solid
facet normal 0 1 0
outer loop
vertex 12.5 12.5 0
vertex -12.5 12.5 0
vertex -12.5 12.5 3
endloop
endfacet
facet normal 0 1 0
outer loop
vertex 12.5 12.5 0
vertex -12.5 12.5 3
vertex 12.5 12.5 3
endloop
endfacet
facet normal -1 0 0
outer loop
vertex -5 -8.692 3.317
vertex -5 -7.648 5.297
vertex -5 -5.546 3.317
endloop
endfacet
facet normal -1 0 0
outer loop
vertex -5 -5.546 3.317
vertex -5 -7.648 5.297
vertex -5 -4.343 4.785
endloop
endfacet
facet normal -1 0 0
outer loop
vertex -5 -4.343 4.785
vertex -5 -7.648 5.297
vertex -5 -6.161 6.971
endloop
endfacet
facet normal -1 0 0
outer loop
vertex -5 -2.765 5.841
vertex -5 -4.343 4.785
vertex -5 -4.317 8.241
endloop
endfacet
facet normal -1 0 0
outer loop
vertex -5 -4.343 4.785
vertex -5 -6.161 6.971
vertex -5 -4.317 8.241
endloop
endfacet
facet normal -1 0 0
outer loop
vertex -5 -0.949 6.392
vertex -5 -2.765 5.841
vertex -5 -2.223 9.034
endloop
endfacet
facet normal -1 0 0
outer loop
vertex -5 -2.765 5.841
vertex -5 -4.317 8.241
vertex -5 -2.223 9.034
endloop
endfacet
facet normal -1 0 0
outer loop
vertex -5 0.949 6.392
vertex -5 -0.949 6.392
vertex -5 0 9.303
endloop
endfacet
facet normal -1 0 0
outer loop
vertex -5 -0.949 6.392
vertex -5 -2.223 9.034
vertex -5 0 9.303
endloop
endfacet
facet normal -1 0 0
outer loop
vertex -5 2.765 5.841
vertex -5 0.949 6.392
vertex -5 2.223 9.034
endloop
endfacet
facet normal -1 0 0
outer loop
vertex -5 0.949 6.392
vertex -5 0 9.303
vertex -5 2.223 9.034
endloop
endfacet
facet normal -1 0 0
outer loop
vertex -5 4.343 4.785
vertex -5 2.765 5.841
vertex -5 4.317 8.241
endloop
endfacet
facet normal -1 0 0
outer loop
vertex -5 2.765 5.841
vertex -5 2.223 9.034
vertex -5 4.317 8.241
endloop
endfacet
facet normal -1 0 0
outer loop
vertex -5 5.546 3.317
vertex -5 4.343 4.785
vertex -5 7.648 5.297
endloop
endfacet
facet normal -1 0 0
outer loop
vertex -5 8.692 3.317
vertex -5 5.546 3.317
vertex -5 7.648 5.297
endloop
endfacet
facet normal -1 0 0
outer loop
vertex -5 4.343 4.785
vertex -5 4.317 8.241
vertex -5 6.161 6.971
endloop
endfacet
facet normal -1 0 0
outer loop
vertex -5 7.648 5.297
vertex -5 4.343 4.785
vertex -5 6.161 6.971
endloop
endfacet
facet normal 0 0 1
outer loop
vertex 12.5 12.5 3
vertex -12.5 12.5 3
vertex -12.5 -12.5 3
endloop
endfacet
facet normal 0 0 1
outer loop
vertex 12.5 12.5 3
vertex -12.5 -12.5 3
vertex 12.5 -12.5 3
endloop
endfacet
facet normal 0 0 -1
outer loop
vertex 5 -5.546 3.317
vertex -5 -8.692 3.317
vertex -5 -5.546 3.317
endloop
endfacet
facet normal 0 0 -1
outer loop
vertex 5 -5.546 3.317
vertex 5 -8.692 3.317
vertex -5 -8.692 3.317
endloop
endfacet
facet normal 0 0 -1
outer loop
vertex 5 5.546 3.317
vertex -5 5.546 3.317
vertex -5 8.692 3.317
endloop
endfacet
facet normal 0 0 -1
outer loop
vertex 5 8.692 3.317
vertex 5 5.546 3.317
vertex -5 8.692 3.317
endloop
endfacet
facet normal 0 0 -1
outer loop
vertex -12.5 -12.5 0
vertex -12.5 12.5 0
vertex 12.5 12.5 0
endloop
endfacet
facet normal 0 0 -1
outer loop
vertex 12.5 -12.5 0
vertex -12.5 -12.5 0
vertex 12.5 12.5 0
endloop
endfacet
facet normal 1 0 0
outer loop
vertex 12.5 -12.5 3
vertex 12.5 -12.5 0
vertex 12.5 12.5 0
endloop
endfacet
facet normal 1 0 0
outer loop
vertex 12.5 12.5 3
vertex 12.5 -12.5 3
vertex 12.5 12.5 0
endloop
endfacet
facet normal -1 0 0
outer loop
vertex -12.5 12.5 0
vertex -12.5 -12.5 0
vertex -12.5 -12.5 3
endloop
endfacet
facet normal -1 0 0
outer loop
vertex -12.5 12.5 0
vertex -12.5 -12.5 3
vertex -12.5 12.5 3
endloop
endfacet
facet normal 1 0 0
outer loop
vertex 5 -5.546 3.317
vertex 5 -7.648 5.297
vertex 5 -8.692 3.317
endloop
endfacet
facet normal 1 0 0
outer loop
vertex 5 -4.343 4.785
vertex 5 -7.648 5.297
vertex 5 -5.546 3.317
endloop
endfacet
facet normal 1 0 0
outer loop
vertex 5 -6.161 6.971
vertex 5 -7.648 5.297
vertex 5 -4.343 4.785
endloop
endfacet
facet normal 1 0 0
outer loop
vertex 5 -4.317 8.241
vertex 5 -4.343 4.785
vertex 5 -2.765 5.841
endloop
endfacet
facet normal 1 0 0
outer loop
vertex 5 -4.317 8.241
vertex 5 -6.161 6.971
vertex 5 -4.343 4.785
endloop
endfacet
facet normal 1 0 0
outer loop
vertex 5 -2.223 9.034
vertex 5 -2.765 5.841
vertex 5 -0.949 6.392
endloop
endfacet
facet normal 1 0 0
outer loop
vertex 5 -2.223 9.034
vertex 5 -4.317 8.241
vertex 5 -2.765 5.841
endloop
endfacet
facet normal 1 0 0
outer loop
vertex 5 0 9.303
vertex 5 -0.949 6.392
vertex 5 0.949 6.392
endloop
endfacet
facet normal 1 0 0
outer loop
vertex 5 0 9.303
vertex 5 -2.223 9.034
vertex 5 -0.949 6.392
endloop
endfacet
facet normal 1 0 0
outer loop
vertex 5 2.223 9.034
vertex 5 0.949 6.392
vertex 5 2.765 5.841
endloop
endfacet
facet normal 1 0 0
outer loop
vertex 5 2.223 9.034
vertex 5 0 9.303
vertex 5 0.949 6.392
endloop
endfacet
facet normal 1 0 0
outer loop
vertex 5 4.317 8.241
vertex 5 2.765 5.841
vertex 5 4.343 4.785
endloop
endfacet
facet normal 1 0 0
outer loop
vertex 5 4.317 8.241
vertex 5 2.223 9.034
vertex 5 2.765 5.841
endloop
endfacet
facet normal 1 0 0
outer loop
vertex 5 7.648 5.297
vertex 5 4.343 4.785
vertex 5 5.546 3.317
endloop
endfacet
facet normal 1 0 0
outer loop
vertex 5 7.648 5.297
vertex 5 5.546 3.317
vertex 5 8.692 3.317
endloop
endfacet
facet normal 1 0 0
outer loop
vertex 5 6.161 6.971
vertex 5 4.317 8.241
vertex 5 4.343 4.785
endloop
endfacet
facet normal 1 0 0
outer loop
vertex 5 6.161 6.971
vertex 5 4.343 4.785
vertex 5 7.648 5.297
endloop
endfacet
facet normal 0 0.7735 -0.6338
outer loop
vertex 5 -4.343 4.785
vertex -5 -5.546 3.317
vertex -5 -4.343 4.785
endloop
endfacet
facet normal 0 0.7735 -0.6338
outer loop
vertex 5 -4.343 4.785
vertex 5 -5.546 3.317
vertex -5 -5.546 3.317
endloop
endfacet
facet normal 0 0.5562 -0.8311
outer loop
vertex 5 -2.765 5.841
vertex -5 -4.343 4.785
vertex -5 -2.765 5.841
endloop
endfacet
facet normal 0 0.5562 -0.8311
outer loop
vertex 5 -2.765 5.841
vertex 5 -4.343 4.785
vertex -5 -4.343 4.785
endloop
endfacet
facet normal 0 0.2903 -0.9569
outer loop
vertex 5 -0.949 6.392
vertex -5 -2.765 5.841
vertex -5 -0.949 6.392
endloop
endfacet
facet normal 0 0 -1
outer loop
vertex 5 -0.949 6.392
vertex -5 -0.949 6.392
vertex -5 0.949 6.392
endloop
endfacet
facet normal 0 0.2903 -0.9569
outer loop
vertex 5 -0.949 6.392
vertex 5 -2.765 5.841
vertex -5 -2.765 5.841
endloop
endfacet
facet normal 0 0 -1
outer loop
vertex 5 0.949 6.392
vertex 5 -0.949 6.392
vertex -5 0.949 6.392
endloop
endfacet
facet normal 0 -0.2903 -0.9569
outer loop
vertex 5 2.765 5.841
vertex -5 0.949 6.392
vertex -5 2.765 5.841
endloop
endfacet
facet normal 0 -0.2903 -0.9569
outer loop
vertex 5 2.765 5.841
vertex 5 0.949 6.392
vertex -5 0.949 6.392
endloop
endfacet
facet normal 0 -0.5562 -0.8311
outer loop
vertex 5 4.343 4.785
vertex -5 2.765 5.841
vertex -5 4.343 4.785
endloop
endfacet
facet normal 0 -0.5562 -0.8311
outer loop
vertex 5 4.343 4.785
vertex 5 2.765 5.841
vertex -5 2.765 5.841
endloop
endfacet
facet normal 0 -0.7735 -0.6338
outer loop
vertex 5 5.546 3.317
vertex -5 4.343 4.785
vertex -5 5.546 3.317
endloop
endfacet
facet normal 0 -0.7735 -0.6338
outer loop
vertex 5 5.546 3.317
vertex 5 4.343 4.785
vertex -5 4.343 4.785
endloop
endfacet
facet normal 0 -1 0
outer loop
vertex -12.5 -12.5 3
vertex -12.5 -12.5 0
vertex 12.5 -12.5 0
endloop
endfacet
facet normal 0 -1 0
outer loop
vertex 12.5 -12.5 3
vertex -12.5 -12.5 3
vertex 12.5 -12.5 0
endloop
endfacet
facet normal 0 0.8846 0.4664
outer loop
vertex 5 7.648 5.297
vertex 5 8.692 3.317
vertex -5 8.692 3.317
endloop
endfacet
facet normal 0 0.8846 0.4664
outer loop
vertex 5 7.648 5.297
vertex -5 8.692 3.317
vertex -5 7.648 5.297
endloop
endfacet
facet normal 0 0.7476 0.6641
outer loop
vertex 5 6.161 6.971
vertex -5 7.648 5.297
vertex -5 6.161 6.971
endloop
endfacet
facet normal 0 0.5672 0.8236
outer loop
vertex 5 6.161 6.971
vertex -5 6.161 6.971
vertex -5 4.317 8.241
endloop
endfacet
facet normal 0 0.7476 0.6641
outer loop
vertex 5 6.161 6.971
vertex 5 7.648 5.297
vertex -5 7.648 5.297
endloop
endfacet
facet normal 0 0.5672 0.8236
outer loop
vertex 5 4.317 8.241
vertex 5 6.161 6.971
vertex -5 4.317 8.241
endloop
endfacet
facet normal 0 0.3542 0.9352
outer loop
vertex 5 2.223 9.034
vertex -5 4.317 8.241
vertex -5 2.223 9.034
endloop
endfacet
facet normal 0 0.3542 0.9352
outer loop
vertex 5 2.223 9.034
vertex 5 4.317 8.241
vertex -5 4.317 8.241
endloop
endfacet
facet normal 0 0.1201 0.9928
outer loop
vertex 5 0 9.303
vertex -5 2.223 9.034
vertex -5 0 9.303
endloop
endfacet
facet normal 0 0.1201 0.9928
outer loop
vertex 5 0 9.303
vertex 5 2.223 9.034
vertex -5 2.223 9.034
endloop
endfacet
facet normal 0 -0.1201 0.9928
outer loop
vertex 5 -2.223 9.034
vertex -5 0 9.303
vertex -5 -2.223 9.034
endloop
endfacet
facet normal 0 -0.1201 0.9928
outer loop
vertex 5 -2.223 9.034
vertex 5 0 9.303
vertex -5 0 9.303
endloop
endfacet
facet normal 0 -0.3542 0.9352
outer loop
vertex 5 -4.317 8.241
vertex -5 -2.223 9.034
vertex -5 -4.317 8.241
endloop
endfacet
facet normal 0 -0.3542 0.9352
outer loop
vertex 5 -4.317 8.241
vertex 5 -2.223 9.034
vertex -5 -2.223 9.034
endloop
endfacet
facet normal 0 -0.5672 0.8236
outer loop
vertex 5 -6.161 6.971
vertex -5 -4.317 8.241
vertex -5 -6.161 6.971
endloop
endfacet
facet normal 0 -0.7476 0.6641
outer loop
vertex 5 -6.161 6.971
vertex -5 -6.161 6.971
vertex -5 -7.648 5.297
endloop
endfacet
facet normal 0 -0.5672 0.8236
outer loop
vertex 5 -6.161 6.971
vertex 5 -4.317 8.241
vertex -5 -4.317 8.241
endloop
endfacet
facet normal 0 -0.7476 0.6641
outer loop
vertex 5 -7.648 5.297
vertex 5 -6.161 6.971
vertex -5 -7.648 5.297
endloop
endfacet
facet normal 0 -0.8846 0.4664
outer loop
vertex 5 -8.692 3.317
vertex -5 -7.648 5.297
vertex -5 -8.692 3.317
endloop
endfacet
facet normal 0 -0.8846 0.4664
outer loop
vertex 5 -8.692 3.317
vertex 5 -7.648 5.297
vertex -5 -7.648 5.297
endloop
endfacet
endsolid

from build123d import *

# Parameters (mm, degrees)
F0_W     = 25
F0_H     = 25
F1_DEPTH = 3
F3_DEPTH = 5


with BuildPart() as f1:
    # F0 (on Top) → F1 (new body)
    with BuildSketch(Plane.XY):
        Rectangle(F0_W, F0_H)
    extrude(amount=F1_DEPTH)


with BuildPart() as f3:
    # F2 (on Right) → F3 (new body, symmetric)
    with BuildSketch(Plane.YZ):
        with BuildLine():
            ThreePointArc((-5.5460641964, 3.3167562178), (0, 6.4621745472), (5.5460641964, 3.3167562178))
            Line((5.5460641964, 3.3167562178), (8.6921075266, 3.3167562178))
            ThreePointArc((8.6921075266, 3.3167562178), (0, 9.3034189985), (-8.6921075266, 3.3167562178))
            Line((-8.6921075266, 3.3167562178), (-5.5460641964, 3.3167562178))
        make_face()
    extrude(amount=F3_DEPTH, both=True)


solid = Compound([f1.part, f3.part])
